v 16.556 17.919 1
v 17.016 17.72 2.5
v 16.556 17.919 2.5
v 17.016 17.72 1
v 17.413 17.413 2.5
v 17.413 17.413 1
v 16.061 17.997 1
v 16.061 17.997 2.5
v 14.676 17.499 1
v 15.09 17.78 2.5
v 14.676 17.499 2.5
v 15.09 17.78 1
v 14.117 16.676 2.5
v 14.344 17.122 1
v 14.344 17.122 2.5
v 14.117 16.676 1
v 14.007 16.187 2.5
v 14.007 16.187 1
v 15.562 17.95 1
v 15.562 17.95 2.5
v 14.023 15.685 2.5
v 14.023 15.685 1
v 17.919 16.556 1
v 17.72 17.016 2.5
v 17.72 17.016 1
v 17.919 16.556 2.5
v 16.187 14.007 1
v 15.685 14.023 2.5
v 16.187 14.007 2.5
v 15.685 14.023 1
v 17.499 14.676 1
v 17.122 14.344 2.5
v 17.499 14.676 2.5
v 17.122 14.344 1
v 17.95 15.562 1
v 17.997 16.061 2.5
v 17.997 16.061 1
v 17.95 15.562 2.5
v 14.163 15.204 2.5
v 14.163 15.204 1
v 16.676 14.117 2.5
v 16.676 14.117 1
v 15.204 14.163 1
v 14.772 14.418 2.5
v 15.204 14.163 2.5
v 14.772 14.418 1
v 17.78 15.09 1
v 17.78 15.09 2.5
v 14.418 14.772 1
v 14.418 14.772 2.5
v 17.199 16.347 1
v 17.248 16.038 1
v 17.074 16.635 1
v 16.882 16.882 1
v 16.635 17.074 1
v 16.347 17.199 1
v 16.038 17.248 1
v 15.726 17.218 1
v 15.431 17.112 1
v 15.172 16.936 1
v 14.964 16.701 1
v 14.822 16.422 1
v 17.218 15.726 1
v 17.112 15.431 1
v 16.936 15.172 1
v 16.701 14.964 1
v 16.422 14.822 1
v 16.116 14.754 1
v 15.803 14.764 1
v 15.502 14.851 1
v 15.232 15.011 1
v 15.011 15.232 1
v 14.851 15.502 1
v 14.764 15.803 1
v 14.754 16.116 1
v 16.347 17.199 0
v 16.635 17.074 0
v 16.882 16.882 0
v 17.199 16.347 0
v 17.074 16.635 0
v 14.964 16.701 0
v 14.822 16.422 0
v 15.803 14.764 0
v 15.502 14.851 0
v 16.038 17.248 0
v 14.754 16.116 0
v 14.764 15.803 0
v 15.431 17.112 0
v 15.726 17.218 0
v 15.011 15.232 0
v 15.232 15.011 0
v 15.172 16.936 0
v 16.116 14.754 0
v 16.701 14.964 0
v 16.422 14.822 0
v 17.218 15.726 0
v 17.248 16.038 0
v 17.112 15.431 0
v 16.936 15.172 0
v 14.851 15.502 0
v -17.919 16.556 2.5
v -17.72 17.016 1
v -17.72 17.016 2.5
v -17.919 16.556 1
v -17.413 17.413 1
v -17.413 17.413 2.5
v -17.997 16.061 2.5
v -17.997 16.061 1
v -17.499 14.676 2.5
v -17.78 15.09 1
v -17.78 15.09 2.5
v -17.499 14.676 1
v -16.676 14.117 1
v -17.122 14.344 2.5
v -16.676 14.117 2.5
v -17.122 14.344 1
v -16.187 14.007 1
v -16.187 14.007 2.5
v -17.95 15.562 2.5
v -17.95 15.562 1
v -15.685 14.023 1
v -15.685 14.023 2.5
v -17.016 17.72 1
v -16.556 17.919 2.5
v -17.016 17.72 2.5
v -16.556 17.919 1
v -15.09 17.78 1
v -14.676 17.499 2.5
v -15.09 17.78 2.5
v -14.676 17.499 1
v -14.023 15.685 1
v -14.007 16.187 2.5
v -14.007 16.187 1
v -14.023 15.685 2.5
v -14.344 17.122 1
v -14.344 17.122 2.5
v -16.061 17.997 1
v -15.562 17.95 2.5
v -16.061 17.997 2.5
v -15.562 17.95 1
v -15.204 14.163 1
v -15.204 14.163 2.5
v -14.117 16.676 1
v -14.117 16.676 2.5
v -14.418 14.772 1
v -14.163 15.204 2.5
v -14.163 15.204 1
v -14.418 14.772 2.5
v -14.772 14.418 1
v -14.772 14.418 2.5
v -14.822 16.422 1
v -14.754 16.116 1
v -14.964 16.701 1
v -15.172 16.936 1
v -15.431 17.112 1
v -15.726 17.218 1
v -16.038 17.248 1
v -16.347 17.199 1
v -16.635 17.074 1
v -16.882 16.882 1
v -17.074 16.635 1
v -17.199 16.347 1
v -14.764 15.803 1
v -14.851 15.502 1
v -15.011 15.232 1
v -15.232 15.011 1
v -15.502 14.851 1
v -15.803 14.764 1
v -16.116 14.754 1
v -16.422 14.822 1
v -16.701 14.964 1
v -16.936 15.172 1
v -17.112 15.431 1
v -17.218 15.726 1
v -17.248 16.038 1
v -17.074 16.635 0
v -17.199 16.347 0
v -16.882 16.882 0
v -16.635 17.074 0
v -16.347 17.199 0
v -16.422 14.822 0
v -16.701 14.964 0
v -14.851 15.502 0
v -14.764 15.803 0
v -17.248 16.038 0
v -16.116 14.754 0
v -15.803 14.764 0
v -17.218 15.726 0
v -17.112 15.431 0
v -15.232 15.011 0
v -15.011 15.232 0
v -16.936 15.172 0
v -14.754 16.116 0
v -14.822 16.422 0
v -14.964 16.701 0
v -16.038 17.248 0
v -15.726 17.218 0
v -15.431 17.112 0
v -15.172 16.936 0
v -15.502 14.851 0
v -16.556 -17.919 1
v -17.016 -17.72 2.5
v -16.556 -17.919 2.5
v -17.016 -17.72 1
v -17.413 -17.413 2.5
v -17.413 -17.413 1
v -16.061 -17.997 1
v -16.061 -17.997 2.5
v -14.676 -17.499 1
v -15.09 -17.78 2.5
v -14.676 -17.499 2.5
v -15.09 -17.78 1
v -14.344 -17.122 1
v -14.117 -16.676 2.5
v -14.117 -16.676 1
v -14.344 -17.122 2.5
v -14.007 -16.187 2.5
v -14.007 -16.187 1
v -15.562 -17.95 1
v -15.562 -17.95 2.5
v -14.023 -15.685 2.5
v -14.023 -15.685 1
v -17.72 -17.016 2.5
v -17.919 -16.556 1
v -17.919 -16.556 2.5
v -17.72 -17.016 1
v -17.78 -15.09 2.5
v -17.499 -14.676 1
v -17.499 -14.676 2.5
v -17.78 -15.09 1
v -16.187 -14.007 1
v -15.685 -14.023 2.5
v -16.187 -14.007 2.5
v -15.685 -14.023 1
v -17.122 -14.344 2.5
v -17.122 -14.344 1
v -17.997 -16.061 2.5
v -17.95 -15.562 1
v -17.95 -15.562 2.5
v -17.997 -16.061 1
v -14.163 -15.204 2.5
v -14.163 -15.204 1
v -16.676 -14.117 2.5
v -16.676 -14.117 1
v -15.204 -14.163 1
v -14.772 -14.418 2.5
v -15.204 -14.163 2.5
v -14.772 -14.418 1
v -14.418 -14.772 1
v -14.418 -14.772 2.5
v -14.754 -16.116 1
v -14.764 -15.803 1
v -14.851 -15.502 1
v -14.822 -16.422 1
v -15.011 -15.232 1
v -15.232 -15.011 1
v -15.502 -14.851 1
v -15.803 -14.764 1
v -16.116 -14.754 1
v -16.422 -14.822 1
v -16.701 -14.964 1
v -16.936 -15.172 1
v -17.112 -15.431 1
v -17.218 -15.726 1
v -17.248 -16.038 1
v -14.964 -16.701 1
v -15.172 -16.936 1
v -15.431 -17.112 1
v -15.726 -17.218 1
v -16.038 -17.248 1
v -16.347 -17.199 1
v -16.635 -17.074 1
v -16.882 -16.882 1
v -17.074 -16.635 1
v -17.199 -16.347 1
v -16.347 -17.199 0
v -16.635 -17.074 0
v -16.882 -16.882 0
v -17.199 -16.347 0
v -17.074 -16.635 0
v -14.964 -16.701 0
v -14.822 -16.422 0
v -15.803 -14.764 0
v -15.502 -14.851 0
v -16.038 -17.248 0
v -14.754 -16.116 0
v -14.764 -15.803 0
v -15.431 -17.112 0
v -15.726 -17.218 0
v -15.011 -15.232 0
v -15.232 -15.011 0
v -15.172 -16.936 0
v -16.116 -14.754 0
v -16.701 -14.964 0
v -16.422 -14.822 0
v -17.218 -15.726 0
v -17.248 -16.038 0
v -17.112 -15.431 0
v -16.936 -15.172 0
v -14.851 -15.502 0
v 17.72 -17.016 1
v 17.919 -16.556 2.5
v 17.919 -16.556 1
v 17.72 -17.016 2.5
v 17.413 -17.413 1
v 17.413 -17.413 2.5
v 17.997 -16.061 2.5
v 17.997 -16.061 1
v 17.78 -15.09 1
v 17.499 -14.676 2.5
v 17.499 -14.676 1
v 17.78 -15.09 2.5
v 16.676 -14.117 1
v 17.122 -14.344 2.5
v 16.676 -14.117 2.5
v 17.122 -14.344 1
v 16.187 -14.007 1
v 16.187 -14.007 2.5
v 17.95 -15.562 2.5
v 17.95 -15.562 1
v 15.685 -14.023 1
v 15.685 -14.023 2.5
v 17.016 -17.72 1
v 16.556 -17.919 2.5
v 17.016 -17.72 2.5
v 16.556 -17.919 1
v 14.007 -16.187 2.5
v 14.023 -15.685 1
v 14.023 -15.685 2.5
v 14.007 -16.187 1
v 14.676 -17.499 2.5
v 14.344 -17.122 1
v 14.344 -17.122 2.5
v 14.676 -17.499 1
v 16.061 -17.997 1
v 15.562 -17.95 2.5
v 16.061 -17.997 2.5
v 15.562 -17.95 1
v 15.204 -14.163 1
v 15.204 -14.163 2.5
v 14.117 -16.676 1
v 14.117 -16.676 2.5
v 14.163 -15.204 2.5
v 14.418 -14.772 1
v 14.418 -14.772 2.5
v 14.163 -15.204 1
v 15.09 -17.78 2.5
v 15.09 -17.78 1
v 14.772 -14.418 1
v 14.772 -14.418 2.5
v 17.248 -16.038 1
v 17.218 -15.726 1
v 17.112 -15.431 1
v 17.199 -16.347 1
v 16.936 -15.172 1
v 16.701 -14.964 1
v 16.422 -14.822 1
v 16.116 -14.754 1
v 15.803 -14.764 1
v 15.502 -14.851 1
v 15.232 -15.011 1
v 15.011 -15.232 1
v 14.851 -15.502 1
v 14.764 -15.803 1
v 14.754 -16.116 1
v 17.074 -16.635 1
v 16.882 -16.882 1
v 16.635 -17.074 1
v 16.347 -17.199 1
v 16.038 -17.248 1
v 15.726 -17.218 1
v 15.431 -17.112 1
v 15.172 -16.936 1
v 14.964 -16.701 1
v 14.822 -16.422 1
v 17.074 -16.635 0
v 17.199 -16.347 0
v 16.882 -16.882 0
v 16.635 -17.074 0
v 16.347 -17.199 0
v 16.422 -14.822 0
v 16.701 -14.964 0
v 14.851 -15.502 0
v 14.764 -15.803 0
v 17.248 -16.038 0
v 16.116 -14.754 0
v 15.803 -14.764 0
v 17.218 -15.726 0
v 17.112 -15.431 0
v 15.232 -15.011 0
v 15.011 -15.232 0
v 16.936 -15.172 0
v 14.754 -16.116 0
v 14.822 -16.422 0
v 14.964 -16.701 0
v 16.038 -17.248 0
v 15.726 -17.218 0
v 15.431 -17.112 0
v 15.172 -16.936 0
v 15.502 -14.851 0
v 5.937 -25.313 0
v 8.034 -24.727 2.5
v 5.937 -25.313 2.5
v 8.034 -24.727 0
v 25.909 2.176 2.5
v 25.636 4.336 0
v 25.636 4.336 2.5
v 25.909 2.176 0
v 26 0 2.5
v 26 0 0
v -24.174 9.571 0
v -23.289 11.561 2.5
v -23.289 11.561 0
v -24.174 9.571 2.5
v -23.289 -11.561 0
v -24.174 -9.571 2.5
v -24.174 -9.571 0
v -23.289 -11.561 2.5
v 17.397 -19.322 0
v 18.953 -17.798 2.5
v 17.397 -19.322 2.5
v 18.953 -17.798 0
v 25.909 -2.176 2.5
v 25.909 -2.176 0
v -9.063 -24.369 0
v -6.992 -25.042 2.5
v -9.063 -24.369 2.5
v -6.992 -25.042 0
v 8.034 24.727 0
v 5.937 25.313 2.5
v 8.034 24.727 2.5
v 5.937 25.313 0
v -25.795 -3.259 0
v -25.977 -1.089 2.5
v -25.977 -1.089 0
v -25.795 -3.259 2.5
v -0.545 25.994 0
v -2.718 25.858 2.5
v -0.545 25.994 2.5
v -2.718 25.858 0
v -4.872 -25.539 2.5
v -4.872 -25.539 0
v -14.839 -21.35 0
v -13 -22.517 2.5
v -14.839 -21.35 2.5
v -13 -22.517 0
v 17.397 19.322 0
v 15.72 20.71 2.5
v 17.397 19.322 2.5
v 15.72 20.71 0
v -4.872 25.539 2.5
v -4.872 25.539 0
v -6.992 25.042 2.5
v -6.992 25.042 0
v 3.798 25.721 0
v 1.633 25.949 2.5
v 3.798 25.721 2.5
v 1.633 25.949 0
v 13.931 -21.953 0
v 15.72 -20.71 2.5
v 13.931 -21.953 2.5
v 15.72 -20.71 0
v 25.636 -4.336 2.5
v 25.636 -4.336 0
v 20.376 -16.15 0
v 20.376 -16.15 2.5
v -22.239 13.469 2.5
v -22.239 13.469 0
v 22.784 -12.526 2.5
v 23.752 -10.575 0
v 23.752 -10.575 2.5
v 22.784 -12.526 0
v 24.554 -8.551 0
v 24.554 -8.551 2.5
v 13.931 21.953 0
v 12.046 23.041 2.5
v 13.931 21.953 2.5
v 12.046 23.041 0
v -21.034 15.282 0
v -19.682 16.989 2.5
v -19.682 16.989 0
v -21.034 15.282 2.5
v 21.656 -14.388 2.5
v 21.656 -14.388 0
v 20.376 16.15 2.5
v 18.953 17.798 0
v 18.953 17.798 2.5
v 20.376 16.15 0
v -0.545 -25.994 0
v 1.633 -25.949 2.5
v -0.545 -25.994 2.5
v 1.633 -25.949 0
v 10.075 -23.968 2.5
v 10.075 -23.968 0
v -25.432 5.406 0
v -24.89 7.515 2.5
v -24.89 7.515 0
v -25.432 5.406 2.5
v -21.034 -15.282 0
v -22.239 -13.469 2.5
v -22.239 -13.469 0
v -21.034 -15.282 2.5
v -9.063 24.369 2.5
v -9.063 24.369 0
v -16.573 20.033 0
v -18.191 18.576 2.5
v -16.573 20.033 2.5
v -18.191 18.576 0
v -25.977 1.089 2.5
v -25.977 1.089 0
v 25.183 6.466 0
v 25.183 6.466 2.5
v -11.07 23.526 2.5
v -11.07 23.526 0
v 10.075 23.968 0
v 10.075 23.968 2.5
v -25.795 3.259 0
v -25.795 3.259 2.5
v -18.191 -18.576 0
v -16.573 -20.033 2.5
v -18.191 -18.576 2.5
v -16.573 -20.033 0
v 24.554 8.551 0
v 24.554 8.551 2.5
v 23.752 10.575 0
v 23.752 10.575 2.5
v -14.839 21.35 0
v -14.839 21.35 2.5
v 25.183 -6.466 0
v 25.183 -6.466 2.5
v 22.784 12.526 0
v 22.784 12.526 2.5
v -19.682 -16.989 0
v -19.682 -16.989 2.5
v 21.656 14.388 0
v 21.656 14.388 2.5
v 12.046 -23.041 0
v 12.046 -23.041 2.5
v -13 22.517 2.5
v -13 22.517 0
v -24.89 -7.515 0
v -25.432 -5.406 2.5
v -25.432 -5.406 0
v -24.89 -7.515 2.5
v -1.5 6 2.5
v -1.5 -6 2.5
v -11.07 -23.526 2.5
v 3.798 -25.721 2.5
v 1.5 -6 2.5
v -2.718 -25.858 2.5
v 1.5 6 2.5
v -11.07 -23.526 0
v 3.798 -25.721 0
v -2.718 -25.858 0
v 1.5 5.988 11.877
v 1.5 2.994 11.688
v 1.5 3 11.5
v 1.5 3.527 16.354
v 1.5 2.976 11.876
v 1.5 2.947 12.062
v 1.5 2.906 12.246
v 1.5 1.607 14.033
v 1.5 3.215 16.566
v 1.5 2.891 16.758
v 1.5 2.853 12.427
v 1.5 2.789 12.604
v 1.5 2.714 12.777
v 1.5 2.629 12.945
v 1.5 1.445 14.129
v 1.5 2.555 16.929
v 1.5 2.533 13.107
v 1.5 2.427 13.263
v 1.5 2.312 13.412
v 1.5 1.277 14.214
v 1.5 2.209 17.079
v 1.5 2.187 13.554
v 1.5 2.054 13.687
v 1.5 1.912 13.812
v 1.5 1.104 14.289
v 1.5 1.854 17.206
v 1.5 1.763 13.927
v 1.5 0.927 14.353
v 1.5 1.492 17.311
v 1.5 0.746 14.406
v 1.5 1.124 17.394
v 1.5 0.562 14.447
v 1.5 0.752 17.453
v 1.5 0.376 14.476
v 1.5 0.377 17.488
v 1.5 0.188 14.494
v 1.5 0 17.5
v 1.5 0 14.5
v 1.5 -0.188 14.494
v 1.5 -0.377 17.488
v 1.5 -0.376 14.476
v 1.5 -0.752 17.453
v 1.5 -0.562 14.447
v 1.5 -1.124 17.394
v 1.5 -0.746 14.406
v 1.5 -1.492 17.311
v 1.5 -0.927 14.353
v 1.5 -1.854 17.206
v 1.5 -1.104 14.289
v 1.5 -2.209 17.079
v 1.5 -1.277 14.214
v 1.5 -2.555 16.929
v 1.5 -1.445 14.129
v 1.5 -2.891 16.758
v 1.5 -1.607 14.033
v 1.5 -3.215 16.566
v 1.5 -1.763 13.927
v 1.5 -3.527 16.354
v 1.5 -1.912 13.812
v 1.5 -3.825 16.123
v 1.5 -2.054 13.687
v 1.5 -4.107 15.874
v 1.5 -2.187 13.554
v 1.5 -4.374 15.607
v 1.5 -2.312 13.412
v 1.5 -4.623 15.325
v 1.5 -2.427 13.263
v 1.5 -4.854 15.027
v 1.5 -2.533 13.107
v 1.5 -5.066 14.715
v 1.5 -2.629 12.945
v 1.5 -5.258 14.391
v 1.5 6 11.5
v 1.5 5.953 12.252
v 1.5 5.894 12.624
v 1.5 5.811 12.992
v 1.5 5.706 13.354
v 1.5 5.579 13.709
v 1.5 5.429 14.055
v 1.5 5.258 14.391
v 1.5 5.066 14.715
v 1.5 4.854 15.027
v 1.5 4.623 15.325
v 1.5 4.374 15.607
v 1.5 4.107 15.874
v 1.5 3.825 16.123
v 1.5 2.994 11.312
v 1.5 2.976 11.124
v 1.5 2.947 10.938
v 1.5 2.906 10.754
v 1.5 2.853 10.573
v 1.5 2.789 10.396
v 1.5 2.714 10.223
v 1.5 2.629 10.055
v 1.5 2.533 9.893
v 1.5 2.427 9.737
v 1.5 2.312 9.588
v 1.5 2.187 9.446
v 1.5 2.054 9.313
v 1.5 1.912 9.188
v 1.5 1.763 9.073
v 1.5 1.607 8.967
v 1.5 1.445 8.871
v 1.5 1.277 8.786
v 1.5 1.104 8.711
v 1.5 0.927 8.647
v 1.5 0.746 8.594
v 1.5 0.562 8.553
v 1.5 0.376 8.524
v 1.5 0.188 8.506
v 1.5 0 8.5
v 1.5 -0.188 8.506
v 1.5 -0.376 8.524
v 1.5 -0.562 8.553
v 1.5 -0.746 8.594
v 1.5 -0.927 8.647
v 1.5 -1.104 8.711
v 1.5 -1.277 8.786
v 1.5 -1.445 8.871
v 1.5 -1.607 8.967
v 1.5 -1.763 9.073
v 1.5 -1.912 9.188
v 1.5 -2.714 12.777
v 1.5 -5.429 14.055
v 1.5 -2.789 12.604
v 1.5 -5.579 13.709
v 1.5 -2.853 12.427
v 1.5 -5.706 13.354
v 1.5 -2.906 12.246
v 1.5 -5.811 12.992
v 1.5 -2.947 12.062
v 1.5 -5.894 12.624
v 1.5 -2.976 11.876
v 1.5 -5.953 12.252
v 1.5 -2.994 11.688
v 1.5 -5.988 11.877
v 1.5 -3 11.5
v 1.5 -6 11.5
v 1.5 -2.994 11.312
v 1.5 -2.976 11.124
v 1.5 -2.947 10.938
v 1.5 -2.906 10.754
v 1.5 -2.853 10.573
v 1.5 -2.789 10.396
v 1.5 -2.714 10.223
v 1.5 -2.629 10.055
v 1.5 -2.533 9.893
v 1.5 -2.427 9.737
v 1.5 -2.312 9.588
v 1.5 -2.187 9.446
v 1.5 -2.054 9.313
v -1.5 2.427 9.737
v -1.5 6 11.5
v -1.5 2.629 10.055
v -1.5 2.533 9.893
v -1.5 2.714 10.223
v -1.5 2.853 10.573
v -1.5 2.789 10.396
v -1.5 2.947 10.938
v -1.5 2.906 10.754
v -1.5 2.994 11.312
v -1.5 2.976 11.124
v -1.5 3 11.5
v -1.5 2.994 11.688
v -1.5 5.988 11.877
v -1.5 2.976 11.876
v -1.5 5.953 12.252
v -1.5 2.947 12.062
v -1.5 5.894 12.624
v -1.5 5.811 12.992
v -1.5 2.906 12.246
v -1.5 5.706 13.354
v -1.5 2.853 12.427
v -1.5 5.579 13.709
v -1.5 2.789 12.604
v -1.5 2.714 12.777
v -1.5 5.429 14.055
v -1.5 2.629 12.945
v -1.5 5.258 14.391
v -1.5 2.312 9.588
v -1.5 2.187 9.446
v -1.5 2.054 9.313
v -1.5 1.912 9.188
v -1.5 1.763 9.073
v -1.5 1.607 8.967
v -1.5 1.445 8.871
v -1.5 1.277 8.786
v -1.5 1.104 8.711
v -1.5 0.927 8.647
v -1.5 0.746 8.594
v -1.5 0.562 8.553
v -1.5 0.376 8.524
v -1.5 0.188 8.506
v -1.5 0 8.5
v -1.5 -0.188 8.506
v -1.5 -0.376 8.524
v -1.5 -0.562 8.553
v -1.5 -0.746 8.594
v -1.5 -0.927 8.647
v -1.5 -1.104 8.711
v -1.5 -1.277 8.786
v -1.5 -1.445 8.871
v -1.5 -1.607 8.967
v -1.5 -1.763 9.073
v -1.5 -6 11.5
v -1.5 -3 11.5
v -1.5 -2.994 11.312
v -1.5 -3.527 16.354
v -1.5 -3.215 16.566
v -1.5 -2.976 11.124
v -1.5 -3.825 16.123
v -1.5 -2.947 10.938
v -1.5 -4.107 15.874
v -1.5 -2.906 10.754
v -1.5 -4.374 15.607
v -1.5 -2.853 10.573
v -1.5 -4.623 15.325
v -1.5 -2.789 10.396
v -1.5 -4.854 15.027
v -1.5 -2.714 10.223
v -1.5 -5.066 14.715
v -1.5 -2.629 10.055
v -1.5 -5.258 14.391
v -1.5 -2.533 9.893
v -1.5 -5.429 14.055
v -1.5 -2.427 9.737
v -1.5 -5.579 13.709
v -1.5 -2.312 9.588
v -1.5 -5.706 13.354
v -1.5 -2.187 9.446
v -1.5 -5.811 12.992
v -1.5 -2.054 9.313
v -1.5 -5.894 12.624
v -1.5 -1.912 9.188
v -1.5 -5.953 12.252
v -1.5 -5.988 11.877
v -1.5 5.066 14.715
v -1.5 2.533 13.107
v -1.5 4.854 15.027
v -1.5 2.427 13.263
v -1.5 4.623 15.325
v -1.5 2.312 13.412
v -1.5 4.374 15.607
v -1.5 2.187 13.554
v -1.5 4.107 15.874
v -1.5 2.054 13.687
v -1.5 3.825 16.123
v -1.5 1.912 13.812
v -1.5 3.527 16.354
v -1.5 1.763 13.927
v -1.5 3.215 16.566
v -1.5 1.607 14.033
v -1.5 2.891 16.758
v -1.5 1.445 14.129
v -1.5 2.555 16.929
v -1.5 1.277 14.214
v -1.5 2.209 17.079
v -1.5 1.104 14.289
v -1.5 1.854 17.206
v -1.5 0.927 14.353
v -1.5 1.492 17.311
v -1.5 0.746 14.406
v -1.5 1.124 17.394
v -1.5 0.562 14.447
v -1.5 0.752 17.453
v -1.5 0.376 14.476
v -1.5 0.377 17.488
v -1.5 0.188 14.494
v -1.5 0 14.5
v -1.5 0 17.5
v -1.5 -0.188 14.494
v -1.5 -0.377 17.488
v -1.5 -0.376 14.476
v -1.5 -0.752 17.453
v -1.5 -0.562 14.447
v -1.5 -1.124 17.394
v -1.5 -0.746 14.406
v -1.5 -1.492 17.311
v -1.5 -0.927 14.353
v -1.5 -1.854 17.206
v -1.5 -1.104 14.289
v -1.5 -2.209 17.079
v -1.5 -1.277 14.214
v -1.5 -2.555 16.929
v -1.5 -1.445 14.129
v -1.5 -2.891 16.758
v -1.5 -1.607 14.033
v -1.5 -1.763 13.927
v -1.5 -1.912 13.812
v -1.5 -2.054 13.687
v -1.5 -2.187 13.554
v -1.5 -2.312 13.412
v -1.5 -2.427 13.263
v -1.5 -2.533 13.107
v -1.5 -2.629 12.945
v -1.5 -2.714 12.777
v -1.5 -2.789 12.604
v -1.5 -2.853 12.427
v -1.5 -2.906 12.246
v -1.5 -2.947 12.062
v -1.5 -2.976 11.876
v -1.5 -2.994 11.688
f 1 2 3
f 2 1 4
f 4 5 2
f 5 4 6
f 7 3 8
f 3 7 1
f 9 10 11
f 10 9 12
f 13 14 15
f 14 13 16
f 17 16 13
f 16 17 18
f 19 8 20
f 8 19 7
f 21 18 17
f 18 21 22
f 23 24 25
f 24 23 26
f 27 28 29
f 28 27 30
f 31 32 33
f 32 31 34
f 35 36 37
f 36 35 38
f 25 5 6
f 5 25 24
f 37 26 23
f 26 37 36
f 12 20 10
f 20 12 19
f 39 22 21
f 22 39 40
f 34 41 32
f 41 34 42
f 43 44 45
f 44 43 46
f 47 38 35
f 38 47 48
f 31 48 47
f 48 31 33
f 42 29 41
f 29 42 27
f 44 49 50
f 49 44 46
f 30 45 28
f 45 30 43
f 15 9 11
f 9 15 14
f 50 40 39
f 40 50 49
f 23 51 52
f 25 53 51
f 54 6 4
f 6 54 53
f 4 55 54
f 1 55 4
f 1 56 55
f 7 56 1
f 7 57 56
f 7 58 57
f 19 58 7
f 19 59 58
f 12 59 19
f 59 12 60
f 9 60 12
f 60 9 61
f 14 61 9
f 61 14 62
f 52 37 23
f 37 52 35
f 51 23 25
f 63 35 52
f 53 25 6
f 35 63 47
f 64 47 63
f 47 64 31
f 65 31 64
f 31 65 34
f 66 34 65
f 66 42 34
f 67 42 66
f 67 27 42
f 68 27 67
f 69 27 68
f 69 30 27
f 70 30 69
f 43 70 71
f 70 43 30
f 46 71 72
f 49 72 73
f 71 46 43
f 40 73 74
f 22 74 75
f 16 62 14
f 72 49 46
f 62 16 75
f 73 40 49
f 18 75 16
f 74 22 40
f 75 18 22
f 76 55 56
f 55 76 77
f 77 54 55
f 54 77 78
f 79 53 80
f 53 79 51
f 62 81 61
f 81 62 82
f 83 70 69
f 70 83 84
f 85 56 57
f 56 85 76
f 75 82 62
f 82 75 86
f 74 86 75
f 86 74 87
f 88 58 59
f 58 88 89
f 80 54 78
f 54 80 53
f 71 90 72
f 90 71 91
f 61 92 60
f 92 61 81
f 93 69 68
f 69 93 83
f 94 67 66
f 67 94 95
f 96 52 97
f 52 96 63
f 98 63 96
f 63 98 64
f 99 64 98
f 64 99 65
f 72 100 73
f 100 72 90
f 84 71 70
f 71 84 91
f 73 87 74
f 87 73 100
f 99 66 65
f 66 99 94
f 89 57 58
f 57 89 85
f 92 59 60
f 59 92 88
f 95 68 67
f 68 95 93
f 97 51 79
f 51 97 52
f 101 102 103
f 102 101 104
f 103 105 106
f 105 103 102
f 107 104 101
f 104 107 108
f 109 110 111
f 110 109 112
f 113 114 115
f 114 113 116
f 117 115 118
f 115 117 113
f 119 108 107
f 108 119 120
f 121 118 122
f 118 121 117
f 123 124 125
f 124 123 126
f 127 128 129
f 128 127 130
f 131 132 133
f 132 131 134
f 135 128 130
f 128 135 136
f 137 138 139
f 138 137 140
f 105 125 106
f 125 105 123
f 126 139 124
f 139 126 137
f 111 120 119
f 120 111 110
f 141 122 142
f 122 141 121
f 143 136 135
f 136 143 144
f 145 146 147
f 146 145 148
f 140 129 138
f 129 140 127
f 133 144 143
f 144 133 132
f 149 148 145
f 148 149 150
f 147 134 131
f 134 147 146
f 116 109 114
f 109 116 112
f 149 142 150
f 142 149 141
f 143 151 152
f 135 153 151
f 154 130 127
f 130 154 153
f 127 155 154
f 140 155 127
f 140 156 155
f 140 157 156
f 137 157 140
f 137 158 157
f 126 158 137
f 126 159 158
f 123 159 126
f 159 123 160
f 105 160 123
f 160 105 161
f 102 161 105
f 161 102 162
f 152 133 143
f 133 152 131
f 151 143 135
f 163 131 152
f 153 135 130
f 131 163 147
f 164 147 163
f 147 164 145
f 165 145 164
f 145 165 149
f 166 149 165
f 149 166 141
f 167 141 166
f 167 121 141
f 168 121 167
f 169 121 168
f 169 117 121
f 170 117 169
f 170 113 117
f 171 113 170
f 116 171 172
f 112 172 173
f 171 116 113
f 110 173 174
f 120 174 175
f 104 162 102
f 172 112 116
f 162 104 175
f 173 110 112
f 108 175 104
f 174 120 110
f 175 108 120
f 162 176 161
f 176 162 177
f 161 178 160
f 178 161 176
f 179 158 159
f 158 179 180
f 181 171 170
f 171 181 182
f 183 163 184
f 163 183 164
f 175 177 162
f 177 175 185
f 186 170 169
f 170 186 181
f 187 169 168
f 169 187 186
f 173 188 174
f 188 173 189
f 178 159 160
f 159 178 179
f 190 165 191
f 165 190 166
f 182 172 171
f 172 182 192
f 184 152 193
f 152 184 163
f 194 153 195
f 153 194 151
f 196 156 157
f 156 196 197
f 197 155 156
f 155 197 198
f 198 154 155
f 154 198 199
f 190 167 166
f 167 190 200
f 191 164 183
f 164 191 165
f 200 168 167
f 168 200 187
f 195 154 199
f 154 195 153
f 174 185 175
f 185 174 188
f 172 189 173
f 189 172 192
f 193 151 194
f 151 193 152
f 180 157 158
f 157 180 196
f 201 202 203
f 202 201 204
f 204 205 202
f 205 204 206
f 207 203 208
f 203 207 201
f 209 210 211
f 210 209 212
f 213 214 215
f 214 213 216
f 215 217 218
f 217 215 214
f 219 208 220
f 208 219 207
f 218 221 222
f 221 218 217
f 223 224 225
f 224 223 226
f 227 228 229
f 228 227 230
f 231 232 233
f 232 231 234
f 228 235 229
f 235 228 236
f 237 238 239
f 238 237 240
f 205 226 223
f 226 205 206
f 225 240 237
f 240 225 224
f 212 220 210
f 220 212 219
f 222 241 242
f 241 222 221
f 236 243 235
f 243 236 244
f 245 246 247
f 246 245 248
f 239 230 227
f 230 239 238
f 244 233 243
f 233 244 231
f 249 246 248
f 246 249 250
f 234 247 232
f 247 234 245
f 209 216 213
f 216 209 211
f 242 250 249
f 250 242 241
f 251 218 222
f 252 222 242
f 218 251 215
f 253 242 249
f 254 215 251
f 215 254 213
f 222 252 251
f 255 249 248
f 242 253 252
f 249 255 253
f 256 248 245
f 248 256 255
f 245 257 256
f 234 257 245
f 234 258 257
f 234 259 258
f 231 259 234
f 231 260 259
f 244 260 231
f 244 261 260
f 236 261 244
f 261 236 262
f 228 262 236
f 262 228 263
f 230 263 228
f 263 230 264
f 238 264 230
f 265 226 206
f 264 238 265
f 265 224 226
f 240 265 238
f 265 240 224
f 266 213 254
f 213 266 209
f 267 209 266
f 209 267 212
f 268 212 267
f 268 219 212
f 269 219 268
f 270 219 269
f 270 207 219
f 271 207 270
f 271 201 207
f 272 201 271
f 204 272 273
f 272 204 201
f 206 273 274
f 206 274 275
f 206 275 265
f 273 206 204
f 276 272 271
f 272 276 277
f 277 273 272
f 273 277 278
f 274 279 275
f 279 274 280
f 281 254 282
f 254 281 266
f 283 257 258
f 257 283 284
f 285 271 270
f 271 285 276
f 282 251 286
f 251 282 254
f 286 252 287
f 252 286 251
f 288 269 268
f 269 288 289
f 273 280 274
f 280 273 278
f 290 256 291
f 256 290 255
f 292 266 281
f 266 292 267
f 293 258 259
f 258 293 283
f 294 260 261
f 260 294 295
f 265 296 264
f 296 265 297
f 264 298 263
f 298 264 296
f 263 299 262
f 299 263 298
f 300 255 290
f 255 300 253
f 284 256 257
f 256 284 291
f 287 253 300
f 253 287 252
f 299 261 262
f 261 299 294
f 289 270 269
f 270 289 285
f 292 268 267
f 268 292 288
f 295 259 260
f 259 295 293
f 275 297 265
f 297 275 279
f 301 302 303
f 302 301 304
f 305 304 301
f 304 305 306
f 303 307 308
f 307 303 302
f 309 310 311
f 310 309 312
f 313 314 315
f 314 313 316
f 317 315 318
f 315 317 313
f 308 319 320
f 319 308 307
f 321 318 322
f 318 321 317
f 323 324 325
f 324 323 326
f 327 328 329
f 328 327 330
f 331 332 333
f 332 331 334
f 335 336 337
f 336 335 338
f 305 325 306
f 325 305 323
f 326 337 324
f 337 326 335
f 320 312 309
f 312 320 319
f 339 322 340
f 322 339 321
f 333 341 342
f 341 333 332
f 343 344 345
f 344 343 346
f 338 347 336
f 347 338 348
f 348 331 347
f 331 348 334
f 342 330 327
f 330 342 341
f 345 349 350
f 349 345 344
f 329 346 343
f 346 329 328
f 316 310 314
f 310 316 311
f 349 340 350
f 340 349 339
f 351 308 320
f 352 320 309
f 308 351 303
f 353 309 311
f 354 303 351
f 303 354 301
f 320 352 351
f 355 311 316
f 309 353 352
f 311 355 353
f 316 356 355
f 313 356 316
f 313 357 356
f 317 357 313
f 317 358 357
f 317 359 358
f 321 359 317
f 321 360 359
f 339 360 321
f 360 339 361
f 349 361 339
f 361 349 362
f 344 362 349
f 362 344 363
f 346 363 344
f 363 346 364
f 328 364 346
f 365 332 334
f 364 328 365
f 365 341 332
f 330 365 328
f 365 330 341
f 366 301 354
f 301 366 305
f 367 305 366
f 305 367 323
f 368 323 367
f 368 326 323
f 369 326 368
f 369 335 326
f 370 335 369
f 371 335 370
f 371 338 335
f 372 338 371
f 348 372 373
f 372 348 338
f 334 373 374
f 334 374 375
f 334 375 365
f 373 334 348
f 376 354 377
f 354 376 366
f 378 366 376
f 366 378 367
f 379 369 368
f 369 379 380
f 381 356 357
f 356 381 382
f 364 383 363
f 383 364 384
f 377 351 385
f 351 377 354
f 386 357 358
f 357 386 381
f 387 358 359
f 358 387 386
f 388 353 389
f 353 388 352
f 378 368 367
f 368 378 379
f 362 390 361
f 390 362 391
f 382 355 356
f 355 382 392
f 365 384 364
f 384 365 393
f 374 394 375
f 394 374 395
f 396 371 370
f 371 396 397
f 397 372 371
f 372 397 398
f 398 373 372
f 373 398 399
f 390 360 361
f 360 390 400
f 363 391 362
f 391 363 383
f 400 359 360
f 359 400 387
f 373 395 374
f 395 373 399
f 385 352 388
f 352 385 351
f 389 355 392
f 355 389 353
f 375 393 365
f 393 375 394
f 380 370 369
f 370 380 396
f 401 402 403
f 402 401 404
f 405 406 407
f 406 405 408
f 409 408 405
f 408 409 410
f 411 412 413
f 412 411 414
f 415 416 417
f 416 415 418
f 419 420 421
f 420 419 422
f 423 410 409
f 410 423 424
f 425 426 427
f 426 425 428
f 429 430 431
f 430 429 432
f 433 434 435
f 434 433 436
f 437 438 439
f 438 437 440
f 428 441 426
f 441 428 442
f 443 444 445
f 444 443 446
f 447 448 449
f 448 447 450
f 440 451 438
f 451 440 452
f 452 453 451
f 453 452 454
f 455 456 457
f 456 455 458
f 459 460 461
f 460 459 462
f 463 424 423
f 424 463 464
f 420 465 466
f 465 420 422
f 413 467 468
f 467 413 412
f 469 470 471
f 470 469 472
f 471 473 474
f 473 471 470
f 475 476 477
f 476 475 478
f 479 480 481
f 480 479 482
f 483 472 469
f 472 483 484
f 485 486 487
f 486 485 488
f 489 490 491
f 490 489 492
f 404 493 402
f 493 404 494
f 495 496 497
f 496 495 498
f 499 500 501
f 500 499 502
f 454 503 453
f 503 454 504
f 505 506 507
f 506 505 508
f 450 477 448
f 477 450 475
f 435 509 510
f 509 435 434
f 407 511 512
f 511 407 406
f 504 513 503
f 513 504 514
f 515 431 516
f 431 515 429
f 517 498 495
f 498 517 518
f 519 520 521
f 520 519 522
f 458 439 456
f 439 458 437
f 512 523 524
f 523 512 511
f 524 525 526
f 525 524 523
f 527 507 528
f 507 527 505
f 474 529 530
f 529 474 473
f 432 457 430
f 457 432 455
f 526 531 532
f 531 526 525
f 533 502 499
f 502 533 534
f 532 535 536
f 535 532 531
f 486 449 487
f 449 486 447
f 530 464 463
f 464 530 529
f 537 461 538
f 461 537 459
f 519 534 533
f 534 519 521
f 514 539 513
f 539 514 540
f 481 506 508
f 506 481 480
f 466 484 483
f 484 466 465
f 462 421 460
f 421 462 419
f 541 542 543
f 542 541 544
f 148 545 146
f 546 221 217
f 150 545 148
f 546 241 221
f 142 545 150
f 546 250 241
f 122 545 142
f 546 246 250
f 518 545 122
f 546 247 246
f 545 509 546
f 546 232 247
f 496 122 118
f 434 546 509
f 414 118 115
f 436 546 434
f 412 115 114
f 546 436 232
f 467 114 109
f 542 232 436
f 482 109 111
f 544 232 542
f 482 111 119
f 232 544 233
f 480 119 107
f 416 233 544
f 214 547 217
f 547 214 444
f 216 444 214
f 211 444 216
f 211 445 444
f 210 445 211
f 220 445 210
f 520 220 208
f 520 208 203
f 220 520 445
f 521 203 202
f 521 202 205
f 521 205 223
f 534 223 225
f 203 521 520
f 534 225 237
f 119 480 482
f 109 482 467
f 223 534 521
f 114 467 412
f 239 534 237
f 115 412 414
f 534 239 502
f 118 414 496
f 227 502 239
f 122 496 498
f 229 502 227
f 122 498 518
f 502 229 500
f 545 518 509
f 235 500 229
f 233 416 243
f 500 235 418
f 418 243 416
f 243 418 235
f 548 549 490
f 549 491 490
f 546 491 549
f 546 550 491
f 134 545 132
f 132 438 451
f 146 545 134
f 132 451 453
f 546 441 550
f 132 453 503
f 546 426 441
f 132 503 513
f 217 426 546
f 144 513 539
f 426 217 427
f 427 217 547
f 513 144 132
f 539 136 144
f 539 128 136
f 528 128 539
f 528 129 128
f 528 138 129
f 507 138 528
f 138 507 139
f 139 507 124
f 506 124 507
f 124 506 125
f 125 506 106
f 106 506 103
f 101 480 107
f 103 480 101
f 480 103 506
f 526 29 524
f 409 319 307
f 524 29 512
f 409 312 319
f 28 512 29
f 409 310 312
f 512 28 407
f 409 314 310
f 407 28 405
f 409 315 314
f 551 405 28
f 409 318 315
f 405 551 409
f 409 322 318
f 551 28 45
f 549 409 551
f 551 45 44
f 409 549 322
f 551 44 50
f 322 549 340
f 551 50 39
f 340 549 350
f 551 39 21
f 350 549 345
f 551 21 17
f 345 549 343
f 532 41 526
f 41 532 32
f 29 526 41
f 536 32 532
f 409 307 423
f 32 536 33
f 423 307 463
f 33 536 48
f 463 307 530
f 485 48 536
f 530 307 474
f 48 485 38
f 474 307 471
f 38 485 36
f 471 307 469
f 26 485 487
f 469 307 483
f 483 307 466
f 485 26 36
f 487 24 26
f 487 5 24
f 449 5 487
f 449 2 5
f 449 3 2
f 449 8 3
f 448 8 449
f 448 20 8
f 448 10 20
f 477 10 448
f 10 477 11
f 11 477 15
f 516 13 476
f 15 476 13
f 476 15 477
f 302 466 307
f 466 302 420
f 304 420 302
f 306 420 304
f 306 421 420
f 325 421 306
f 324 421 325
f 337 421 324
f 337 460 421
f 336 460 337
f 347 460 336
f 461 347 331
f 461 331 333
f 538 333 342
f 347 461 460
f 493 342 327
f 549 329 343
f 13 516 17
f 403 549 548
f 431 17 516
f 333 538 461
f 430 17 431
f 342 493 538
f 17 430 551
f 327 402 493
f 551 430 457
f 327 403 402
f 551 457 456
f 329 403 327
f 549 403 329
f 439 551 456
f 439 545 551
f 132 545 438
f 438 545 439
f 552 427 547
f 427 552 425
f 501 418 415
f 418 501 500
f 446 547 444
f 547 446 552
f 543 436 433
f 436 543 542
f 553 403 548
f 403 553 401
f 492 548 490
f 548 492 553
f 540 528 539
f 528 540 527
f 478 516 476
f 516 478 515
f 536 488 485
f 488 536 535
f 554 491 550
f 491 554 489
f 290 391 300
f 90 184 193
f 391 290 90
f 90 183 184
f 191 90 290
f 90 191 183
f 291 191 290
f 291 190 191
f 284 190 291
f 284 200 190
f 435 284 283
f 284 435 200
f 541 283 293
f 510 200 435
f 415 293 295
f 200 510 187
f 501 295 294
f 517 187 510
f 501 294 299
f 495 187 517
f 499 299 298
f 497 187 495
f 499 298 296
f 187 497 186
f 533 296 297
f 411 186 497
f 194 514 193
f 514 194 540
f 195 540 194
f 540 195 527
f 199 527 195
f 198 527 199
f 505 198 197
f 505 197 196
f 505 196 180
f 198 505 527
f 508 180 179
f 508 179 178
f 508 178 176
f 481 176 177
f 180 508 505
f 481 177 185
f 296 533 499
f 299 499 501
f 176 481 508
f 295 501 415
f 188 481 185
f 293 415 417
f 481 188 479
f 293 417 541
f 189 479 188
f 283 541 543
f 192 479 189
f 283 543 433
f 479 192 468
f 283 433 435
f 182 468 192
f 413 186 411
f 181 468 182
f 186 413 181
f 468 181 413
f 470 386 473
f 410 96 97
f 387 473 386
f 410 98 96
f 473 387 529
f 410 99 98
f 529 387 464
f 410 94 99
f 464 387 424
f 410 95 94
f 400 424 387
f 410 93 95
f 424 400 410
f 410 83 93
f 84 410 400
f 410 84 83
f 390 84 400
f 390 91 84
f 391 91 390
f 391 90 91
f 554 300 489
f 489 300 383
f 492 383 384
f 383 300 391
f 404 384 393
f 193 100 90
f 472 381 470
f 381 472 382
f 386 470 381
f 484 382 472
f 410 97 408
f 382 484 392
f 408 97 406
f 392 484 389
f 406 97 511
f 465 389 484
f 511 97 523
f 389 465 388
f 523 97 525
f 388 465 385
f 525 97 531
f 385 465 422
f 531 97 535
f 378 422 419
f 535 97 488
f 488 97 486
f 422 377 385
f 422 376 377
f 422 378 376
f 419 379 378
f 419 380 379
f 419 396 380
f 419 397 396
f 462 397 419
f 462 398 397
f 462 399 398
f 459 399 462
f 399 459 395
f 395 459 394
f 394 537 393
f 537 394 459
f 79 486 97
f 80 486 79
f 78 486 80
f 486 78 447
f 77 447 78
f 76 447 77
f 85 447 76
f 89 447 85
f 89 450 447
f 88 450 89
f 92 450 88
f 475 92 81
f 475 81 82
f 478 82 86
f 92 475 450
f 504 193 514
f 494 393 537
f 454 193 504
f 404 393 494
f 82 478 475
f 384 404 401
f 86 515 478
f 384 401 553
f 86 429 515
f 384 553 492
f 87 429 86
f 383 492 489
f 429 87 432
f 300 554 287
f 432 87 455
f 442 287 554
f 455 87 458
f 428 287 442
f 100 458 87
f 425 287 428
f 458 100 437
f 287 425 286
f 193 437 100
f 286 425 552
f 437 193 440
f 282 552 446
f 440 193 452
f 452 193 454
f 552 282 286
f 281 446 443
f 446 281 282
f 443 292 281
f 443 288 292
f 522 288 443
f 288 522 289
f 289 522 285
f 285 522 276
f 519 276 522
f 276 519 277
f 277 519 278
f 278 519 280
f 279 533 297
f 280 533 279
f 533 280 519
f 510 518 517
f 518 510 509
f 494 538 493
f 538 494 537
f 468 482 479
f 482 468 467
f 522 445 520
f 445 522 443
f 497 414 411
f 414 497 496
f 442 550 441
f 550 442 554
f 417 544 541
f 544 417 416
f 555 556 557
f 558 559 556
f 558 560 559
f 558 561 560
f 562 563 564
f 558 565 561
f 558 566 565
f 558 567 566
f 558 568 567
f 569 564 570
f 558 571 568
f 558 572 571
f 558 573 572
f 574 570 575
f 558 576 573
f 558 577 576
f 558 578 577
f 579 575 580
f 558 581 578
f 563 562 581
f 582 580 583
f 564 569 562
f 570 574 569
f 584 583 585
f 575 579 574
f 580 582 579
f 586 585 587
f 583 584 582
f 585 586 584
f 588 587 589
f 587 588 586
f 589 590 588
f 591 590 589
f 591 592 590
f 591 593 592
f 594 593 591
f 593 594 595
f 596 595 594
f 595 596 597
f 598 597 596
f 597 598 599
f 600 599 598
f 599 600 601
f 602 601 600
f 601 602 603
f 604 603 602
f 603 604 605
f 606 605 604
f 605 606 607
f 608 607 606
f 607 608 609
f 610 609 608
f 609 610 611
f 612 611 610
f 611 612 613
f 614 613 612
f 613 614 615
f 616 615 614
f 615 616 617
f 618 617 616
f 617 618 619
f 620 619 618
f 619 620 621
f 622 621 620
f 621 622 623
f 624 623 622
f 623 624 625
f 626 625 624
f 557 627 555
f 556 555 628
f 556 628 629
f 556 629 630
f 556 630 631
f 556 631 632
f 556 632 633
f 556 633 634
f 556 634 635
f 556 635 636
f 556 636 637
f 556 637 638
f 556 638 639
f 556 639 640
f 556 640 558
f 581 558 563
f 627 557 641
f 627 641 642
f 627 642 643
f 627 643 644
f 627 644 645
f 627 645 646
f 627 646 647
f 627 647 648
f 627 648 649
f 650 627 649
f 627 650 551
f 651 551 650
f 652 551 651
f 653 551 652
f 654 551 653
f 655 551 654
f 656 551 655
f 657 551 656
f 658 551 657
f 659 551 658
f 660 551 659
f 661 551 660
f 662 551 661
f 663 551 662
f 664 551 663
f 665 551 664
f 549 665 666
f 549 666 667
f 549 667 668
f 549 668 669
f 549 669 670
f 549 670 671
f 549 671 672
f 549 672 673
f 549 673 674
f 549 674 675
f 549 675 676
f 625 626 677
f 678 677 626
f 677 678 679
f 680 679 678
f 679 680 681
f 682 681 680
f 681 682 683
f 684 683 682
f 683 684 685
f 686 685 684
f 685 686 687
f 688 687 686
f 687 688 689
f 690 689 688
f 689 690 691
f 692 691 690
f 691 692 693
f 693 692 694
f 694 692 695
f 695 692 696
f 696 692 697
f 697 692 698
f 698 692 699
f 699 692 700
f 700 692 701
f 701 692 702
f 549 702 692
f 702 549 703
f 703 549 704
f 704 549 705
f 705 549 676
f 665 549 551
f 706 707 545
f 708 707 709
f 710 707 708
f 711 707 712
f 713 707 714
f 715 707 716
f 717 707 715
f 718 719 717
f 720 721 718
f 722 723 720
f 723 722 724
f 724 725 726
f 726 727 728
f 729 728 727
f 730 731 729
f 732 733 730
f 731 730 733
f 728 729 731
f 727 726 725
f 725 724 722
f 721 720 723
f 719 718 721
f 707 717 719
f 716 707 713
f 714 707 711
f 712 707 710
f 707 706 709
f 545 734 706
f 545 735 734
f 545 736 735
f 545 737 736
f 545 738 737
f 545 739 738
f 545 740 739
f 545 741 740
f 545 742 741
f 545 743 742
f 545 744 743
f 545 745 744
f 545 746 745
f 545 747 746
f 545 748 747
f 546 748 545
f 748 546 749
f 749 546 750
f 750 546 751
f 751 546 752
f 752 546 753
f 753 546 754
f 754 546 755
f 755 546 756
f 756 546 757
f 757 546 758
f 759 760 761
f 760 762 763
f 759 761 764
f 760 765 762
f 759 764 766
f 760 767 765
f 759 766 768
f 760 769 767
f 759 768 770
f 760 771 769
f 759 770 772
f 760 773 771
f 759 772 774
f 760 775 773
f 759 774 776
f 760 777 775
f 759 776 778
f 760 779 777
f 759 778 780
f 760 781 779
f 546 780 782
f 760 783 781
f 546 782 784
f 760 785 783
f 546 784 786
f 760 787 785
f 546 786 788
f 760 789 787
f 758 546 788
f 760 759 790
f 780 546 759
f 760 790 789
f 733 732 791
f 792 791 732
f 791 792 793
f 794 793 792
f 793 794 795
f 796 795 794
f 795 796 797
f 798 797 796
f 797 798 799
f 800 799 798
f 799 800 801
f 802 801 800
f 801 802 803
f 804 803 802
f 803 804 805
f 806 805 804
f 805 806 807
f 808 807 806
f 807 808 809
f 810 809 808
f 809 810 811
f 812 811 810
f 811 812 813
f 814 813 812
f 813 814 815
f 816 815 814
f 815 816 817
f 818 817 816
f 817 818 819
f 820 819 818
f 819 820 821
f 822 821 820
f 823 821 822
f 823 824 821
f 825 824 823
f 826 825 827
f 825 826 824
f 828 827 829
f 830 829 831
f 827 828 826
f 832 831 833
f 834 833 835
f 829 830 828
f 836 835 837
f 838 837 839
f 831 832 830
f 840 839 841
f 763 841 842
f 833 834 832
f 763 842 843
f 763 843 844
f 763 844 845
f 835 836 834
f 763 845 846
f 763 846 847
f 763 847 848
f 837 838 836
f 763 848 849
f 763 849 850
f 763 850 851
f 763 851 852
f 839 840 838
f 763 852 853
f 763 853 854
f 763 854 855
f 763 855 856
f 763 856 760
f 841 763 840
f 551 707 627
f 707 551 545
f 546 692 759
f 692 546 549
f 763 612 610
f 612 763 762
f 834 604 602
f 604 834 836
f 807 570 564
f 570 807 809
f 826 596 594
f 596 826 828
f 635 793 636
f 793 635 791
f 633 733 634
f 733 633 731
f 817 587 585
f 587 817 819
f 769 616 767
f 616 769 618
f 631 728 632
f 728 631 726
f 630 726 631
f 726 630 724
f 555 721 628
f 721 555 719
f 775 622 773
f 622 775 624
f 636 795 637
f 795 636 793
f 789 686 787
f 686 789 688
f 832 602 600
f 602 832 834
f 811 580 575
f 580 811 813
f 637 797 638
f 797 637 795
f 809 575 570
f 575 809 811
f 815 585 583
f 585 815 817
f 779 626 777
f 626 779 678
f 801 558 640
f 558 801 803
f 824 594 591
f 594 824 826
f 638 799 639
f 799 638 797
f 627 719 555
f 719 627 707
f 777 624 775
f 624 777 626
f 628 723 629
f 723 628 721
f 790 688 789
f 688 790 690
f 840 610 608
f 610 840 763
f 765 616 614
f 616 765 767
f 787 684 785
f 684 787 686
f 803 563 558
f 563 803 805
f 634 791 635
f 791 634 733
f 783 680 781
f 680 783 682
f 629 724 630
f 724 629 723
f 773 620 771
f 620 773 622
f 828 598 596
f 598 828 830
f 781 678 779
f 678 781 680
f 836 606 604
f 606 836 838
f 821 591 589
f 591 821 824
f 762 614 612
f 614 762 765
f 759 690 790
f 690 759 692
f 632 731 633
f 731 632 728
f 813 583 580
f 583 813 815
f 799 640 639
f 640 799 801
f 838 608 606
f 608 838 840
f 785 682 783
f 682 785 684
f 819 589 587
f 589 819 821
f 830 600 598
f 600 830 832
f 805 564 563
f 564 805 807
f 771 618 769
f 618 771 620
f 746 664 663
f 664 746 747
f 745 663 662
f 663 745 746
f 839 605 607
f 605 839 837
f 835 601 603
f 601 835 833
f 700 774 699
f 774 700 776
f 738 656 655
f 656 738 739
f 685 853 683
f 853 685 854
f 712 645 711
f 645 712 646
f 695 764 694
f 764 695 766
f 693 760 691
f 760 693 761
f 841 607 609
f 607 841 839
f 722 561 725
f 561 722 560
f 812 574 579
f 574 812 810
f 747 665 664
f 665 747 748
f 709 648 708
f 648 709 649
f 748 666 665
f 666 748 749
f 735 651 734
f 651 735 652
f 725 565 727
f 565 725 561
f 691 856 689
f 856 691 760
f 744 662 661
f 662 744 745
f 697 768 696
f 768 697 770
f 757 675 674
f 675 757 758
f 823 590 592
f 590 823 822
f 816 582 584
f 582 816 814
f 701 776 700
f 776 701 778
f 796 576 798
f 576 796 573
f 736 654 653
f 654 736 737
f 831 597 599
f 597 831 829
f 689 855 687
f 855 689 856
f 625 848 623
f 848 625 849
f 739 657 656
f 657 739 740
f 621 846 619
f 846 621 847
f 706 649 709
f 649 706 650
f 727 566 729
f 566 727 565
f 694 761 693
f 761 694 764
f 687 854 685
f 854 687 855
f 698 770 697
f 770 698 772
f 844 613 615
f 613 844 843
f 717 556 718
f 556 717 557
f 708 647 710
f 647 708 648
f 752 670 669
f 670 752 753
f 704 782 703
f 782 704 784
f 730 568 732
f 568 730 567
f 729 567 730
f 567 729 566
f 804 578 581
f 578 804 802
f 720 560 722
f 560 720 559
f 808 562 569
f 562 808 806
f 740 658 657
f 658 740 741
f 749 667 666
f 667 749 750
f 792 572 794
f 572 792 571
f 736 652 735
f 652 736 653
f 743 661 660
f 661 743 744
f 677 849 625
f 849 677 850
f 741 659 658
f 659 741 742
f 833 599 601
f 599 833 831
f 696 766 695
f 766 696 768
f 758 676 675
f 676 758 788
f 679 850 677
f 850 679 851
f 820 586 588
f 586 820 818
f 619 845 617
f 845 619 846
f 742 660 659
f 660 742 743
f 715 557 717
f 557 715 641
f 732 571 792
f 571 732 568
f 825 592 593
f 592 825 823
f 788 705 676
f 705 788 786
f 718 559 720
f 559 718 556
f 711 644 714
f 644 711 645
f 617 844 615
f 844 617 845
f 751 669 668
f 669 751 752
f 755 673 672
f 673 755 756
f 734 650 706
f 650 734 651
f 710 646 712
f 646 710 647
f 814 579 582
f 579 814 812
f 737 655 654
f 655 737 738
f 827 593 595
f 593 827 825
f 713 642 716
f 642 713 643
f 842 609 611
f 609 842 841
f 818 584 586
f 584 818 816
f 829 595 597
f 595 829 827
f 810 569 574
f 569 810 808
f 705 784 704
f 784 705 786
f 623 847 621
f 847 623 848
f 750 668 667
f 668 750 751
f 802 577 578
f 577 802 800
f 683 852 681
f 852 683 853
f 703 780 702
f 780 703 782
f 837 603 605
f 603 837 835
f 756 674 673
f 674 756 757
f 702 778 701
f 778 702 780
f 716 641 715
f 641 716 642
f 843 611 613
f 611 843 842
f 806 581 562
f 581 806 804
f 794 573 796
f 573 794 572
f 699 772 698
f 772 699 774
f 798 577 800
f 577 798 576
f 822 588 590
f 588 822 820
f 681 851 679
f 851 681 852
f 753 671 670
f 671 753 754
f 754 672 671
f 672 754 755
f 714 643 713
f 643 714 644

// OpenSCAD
coverDiameter = 52;
screwDiameter = 2.5;
screwHeadDiameter = 4;
screwPosition = 22.625;
hookWidth = 3;
hookDiameter = 12;
hookHeight = 11.5;
hookScrewDiameter = 6;

module cover(d, screwDiameter, screwHeadDiameter, screwPosition) {
    difference() {
        cylinder(r=d/2, h=2.5, $fn=75);
    
        for (rotate1 = [ 45 : 90 : 315 ]) {
            rotate([0,0,rotate1]) {
                translate([screwPosition,0,1]) {
                    cylinder(r=screwHeadDiameter/2, h=10, $fn=25);
                }
                translate([screwPosition,0,-1]) {
                    cylinder(r=screwDiameter/2, h=10, $fn=25);
                }
            }
        }
    }
}


module hook(w,d,h,holeRadius) {
    difference() {
        union() {
            translate([-w/2, -d/2, 0]) {
                cube([w,d,h]);
            }
            translate([0,0,h]) {
                rotate([0,90,0]) {
                    cylinder(r=d/2, h=w, center=true, $fn=100);
                }
            }
        }
        translate([0,0,h]) {
            rotate([0,90,0]) {
                cylinder(r=holeRadius, h=w+2, center=true, $fn=100);
            }
        }
    }
}

cover(d=coverDiameter, screwDiameter=screwDiameter, screwHeadDiameter=screwHeadDiameter, screwPosition=screwPosition);
hook(hookWidth,hookDiameter,hookHeight,hookScrewDiameter/2);
